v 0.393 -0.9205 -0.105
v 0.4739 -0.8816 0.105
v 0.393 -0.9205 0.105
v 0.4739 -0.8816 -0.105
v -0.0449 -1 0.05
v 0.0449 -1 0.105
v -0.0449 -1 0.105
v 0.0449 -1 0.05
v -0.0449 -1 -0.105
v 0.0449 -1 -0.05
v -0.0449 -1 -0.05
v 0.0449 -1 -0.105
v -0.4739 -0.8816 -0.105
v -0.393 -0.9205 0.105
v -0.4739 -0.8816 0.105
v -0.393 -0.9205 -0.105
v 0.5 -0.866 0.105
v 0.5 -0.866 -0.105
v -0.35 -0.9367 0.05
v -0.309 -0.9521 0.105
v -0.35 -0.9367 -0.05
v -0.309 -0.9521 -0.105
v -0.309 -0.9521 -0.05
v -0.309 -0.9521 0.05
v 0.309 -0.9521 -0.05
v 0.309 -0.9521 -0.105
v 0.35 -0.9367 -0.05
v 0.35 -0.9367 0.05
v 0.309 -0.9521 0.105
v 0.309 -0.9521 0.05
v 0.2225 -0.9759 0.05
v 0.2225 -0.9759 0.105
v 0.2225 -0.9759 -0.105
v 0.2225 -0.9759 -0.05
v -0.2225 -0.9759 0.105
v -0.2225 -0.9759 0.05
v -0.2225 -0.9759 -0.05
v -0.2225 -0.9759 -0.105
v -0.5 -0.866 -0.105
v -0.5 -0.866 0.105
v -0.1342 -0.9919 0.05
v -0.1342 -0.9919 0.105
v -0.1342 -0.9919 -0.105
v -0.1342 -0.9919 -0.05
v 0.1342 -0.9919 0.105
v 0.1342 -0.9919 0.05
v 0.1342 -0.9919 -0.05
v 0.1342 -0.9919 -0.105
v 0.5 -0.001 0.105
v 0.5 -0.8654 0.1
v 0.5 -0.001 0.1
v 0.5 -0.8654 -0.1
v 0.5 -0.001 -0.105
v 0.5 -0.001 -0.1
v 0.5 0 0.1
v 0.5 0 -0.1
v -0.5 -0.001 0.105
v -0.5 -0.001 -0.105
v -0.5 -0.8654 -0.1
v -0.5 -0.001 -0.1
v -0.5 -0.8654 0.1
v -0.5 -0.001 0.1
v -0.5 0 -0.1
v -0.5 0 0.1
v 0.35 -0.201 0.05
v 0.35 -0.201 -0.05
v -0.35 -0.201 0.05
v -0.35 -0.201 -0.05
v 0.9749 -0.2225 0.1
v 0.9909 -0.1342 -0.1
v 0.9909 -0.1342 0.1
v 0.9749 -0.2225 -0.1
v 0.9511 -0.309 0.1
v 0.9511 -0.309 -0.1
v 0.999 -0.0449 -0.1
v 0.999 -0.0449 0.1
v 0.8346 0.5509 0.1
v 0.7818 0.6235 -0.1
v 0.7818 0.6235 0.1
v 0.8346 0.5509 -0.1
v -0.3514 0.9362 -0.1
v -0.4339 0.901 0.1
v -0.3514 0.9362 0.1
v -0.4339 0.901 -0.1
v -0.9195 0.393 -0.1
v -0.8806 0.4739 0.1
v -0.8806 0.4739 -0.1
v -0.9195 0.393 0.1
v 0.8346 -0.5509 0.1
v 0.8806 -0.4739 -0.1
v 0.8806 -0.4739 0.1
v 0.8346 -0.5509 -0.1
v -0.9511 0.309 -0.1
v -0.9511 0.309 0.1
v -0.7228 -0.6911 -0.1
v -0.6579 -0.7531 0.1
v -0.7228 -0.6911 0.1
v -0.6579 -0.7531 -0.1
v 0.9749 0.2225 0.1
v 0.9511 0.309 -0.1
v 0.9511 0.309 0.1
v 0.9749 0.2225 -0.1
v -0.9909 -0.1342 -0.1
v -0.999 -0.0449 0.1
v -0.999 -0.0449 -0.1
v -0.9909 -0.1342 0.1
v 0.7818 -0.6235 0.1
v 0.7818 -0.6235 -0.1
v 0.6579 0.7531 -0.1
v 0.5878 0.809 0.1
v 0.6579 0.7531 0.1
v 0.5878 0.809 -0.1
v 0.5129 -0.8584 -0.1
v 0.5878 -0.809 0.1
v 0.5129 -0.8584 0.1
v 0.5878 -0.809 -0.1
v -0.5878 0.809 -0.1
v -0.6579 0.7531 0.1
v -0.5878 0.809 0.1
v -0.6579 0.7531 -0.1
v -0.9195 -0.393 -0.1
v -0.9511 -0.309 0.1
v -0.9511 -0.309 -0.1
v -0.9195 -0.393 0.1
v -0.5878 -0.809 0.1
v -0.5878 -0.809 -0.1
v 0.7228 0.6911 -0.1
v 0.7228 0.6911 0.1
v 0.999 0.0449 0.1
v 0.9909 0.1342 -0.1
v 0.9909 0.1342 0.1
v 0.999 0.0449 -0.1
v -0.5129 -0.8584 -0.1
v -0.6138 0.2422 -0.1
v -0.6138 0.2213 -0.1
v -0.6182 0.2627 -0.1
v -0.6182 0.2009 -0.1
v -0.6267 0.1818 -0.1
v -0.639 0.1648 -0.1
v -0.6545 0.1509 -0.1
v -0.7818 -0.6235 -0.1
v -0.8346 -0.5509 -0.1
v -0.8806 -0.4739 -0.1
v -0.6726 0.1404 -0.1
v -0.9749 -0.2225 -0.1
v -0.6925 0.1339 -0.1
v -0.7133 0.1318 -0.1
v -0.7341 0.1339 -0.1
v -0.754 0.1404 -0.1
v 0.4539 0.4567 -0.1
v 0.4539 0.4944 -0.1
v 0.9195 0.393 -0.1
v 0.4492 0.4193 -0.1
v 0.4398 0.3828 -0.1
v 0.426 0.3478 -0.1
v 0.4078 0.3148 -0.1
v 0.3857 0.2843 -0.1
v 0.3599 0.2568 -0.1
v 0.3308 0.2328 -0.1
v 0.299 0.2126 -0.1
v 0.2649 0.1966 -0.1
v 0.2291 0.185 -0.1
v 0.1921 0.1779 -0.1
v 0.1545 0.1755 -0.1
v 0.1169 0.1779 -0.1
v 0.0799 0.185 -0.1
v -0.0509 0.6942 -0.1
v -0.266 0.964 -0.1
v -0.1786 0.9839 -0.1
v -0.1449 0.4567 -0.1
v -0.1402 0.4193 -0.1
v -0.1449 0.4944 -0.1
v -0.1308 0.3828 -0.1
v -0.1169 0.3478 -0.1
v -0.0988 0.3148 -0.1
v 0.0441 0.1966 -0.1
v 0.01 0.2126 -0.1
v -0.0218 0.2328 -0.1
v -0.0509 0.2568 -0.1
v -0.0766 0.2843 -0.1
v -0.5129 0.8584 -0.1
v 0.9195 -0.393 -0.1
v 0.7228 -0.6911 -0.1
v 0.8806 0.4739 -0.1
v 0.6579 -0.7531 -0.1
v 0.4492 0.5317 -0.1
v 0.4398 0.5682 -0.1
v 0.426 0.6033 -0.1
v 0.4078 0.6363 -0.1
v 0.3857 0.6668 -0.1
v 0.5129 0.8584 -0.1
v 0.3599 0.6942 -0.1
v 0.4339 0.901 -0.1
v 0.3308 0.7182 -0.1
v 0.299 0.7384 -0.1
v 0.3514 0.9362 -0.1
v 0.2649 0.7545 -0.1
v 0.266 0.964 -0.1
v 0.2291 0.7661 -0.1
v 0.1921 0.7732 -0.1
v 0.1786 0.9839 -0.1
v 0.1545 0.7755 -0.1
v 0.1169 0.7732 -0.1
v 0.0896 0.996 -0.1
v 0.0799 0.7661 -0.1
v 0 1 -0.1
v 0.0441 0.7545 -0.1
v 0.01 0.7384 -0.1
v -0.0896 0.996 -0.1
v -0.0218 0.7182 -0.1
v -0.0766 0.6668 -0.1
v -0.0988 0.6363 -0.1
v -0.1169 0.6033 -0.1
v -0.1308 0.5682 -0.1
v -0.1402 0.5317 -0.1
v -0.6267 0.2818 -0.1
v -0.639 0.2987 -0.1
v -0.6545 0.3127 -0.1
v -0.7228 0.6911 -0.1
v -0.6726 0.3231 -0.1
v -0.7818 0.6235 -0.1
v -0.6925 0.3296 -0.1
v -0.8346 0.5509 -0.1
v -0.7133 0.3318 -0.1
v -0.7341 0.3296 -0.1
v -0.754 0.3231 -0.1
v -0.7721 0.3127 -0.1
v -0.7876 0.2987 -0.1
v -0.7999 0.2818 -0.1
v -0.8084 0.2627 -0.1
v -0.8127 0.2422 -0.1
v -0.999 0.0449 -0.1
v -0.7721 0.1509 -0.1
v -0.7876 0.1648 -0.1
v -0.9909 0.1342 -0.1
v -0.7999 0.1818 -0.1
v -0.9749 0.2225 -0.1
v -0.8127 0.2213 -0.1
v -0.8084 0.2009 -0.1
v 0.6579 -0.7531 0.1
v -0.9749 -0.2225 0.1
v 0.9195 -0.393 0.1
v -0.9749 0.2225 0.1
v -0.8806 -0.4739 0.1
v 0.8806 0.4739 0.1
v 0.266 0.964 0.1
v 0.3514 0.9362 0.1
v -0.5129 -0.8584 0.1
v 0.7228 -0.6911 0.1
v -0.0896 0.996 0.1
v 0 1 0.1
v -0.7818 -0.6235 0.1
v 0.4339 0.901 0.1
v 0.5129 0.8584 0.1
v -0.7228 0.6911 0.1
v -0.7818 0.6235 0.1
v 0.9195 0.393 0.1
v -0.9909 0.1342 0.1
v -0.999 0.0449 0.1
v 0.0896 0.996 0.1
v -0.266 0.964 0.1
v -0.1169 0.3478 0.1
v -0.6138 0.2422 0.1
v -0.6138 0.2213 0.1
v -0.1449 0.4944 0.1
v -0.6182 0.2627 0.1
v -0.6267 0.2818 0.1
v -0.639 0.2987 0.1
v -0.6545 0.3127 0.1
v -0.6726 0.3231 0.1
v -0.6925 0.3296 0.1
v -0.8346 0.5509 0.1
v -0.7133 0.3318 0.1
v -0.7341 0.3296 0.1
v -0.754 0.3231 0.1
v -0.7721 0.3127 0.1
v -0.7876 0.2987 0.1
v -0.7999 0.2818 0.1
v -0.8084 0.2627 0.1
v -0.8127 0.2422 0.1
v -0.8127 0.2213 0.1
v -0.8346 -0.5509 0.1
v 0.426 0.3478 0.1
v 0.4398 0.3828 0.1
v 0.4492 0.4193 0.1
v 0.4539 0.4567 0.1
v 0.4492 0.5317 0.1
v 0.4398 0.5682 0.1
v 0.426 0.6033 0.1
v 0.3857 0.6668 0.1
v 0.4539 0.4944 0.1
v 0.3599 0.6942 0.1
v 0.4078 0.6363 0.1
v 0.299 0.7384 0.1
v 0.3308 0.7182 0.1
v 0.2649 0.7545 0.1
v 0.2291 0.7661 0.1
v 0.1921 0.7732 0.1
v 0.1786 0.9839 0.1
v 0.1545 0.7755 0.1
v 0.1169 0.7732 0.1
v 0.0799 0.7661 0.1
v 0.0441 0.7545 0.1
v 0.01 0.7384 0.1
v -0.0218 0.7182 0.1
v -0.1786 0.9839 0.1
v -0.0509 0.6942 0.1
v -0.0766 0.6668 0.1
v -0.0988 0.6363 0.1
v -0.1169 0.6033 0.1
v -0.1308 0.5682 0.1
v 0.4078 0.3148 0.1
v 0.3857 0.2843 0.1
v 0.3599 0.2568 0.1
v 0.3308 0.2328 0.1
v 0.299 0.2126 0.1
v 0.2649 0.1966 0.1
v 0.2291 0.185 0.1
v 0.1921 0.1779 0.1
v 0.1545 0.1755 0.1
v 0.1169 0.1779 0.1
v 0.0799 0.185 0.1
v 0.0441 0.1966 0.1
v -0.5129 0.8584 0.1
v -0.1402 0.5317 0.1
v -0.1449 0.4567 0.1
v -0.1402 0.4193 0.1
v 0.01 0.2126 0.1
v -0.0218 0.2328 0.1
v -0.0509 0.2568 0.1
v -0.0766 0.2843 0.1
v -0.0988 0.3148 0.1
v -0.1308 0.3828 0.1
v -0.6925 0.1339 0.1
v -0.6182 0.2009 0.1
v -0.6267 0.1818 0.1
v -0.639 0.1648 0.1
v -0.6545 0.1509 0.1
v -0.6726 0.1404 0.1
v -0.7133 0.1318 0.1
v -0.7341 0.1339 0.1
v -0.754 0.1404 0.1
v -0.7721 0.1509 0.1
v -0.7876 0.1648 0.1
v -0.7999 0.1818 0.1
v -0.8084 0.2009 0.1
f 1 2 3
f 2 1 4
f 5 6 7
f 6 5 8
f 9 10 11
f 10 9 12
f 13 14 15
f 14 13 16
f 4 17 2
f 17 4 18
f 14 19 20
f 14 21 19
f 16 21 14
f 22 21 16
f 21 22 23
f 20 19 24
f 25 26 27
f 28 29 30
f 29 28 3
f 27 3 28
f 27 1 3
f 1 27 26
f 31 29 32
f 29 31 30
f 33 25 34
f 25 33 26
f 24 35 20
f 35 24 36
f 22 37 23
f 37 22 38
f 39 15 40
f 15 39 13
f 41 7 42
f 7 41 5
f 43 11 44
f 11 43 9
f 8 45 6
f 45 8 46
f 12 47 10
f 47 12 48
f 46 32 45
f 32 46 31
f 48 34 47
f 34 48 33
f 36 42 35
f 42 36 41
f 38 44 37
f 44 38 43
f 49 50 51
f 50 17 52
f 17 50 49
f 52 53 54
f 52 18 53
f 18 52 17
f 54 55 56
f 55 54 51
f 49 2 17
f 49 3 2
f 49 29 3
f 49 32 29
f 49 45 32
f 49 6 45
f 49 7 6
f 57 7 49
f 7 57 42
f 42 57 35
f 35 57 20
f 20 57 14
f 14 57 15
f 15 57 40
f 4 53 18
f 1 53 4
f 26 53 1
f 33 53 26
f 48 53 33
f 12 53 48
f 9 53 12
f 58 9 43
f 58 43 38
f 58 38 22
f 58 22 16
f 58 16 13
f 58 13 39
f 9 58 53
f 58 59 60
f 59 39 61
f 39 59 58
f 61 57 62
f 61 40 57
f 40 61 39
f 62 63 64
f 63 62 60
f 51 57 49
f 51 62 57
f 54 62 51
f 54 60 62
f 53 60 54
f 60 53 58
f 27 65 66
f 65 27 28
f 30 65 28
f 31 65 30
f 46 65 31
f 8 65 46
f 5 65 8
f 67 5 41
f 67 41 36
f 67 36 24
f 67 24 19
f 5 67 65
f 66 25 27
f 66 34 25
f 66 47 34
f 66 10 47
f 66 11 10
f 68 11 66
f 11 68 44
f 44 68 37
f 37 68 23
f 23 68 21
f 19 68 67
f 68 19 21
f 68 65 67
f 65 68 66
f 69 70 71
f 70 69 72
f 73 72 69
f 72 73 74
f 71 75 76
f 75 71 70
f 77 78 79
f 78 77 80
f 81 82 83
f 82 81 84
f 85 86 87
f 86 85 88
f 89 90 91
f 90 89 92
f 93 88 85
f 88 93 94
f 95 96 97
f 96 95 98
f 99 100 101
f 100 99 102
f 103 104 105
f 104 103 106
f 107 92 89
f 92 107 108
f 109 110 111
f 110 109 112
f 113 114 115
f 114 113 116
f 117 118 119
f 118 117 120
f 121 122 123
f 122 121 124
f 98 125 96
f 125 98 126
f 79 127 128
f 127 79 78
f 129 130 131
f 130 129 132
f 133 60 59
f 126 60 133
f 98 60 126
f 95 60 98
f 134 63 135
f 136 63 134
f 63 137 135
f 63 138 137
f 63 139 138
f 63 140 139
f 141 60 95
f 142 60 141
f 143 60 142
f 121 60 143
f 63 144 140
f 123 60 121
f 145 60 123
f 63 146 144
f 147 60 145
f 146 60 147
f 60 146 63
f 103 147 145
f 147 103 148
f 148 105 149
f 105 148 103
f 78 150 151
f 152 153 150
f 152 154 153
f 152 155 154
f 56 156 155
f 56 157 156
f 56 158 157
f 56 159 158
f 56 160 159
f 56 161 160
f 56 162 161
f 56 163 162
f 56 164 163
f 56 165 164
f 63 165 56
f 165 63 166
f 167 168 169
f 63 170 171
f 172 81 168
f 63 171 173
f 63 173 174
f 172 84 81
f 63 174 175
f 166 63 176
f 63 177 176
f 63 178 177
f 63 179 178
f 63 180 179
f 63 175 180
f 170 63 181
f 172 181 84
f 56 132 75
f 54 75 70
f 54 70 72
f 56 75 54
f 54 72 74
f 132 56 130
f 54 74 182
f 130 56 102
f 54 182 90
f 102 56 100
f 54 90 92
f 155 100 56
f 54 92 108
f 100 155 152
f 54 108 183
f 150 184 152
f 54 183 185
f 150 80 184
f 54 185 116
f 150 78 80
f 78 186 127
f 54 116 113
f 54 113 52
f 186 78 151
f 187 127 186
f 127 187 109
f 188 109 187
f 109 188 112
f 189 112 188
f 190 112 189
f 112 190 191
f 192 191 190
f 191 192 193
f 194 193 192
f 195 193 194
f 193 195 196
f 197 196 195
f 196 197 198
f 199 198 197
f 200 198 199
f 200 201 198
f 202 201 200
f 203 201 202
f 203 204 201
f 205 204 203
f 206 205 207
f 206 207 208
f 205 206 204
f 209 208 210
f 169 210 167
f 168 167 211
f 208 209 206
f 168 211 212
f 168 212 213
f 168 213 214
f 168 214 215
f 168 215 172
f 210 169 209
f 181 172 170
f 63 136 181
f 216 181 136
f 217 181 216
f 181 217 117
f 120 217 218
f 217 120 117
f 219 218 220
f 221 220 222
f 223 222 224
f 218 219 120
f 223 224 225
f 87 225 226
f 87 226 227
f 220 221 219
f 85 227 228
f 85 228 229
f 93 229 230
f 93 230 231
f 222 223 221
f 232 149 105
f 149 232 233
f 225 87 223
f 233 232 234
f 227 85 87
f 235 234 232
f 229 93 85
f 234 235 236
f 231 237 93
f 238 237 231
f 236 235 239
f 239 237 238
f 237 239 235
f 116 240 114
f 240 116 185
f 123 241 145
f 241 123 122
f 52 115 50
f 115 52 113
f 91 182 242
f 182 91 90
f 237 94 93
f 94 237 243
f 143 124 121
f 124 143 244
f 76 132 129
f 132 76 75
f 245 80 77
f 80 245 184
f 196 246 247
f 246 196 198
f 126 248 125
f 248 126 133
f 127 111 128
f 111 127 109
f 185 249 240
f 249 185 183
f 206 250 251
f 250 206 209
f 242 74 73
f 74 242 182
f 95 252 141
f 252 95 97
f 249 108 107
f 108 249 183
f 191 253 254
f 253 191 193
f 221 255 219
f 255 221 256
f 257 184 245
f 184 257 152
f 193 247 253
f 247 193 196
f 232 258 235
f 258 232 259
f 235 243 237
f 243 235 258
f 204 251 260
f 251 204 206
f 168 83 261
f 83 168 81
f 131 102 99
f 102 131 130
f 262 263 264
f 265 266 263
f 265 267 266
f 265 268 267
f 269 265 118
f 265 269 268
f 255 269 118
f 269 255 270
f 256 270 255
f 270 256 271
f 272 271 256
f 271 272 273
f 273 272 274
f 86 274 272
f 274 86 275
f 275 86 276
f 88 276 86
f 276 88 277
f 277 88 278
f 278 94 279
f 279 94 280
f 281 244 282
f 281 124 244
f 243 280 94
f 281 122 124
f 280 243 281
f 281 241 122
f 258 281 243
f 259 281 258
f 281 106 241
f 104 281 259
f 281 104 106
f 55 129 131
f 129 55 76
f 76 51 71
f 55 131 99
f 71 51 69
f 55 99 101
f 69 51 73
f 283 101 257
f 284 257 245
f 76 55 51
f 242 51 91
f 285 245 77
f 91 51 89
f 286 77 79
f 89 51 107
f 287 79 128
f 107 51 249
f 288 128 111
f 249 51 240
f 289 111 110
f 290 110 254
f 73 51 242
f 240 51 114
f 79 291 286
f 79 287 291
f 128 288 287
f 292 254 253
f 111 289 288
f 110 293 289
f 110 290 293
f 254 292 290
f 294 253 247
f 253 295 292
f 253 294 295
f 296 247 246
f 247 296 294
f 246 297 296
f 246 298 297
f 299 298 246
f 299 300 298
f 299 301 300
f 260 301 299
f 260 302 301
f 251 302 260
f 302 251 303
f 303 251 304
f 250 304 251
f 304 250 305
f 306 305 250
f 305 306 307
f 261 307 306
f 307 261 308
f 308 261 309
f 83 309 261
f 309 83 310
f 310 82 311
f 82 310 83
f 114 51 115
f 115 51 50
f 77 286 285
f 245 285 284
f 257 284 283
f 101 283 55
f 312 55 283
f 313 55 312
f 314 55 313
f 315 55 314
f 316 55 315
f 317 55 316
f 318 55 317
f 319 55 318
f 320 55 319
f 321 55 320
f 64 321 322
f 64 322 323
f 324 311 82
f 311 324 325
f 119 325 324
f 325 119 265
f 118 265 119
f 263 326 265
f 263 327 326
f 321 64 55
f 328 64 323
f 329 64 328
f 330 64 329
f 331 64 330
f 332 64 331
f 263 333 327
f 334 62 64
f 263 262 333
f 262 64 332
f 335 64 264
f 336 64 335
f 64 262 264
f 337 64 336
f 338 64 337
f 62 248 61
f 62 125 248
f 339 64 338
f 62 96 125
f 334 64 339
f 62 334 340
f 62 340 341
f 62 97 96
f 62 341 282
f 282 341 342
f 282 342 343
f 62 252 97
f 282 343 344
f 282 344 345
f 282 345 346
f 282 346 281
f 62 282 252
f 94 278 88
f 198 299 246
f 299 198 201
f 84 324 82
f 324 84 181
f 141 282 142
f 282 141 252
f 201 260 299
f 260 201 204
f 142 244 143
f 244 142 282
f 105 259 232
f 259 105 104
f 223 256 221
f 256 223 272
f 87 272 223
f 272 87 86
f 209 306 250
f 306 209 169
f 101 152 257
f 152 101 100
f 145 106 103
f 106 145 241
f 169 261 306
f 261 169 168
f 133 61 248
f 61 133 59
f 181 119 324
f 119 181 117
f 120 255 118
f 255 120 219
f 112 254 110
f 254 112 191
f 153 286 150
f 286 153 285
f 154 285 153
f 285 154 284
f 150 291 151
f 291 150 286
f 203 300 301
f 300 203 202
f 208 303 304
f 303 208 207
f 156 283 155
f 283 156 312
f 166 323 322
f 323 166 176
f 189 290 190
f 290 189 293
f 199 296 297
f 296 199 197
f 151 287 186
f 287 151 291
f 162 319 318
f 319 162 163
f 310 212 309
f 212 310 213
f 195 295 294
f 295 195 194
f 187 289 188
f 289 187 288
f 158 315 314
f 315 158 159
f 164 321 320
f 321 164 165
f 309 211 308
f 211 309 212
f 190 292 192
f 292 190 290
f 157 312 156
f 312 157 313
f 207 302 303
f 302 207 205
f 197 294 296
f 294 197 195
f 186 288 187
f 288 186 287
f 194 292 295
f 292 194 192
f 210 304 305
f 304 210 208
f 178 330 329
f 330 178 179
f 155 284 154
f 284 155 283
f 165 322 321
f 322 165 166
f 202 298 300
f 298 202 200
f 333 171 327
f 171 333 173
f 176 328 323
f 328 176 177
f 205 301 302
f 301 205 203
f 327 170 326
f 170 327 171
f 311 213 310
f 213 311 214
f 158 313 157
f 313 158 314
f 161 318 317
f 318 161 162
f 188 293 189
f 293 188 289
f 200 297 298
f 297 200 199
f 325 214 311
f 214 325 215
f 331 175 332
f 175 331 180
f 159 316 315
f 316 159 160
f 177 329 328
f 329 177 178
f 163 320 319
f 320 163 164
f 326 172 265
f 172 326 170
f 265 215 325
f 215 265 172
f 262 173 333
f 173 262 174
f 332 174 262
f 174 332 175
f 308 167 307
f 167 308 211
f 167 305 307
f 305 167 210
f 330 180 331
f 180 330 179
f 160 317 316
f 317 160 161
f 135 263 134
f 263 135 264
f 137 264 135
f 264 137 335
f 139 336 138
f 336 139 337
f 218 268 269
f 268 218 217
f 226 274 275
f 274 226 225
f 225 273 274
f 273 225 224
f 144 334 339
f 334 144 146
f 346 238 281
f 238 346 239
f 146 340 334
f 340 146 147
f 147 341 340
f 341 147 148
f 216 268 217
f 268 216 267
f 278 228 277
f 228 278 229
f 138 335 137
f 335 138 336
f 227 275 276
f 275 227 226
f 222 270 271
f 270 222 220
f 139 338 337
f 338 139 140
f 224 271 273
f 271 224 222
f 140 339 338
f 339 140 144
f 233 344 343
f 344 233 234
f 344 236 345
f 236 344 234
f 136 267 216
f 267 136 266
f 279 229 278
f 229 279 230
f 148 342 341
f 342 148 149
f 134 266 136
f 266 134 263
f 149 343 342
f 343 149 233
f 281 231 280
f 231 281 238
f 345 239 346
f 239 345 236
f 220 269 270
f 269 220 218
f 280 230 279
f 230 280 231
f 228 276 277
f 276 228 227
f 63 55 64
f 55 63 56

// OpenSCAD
l=2;
x=2;
g=2.5;
t=0.7;
h=0.1;
s=0.1;
ok = true;

if (ok) {
  translate([0,-0.001,0]) //scale([0.999,0.999,0.999])
  color("red",alpha=0.5) 
  difference() 
  {
    translate([0,-x/4,0])
      cube([l/2,x/2,0.21],center=true);
    difference() {
      cube([g,g,0.3],center=true);
      cylinder(h=0.4,r=1,center=true,$fn=70);
    }
    translate([-t/2,-1.2,-h/2]) 
      color("blue",0.4) cube([t,1,h]);
  }
}

if (ok) {
    color("gold",alpha=0.8) difference() 
    {
      rotate([0,0,-18]) difference() {
          cylinder(h=0.2,r=1,center=true,$fn=70);
          translate([0,0.5,0])
              cylinder(h=1,r=0.3,center=true,$fn=50);
          translate([-0.75,0,0])
              cylinder(h=1,r=0.1,center=true,$fn=30);
      }
      translate([0,-x/4,0])
        cube([l/2,x/2,0.25],center=true);
    }
}
